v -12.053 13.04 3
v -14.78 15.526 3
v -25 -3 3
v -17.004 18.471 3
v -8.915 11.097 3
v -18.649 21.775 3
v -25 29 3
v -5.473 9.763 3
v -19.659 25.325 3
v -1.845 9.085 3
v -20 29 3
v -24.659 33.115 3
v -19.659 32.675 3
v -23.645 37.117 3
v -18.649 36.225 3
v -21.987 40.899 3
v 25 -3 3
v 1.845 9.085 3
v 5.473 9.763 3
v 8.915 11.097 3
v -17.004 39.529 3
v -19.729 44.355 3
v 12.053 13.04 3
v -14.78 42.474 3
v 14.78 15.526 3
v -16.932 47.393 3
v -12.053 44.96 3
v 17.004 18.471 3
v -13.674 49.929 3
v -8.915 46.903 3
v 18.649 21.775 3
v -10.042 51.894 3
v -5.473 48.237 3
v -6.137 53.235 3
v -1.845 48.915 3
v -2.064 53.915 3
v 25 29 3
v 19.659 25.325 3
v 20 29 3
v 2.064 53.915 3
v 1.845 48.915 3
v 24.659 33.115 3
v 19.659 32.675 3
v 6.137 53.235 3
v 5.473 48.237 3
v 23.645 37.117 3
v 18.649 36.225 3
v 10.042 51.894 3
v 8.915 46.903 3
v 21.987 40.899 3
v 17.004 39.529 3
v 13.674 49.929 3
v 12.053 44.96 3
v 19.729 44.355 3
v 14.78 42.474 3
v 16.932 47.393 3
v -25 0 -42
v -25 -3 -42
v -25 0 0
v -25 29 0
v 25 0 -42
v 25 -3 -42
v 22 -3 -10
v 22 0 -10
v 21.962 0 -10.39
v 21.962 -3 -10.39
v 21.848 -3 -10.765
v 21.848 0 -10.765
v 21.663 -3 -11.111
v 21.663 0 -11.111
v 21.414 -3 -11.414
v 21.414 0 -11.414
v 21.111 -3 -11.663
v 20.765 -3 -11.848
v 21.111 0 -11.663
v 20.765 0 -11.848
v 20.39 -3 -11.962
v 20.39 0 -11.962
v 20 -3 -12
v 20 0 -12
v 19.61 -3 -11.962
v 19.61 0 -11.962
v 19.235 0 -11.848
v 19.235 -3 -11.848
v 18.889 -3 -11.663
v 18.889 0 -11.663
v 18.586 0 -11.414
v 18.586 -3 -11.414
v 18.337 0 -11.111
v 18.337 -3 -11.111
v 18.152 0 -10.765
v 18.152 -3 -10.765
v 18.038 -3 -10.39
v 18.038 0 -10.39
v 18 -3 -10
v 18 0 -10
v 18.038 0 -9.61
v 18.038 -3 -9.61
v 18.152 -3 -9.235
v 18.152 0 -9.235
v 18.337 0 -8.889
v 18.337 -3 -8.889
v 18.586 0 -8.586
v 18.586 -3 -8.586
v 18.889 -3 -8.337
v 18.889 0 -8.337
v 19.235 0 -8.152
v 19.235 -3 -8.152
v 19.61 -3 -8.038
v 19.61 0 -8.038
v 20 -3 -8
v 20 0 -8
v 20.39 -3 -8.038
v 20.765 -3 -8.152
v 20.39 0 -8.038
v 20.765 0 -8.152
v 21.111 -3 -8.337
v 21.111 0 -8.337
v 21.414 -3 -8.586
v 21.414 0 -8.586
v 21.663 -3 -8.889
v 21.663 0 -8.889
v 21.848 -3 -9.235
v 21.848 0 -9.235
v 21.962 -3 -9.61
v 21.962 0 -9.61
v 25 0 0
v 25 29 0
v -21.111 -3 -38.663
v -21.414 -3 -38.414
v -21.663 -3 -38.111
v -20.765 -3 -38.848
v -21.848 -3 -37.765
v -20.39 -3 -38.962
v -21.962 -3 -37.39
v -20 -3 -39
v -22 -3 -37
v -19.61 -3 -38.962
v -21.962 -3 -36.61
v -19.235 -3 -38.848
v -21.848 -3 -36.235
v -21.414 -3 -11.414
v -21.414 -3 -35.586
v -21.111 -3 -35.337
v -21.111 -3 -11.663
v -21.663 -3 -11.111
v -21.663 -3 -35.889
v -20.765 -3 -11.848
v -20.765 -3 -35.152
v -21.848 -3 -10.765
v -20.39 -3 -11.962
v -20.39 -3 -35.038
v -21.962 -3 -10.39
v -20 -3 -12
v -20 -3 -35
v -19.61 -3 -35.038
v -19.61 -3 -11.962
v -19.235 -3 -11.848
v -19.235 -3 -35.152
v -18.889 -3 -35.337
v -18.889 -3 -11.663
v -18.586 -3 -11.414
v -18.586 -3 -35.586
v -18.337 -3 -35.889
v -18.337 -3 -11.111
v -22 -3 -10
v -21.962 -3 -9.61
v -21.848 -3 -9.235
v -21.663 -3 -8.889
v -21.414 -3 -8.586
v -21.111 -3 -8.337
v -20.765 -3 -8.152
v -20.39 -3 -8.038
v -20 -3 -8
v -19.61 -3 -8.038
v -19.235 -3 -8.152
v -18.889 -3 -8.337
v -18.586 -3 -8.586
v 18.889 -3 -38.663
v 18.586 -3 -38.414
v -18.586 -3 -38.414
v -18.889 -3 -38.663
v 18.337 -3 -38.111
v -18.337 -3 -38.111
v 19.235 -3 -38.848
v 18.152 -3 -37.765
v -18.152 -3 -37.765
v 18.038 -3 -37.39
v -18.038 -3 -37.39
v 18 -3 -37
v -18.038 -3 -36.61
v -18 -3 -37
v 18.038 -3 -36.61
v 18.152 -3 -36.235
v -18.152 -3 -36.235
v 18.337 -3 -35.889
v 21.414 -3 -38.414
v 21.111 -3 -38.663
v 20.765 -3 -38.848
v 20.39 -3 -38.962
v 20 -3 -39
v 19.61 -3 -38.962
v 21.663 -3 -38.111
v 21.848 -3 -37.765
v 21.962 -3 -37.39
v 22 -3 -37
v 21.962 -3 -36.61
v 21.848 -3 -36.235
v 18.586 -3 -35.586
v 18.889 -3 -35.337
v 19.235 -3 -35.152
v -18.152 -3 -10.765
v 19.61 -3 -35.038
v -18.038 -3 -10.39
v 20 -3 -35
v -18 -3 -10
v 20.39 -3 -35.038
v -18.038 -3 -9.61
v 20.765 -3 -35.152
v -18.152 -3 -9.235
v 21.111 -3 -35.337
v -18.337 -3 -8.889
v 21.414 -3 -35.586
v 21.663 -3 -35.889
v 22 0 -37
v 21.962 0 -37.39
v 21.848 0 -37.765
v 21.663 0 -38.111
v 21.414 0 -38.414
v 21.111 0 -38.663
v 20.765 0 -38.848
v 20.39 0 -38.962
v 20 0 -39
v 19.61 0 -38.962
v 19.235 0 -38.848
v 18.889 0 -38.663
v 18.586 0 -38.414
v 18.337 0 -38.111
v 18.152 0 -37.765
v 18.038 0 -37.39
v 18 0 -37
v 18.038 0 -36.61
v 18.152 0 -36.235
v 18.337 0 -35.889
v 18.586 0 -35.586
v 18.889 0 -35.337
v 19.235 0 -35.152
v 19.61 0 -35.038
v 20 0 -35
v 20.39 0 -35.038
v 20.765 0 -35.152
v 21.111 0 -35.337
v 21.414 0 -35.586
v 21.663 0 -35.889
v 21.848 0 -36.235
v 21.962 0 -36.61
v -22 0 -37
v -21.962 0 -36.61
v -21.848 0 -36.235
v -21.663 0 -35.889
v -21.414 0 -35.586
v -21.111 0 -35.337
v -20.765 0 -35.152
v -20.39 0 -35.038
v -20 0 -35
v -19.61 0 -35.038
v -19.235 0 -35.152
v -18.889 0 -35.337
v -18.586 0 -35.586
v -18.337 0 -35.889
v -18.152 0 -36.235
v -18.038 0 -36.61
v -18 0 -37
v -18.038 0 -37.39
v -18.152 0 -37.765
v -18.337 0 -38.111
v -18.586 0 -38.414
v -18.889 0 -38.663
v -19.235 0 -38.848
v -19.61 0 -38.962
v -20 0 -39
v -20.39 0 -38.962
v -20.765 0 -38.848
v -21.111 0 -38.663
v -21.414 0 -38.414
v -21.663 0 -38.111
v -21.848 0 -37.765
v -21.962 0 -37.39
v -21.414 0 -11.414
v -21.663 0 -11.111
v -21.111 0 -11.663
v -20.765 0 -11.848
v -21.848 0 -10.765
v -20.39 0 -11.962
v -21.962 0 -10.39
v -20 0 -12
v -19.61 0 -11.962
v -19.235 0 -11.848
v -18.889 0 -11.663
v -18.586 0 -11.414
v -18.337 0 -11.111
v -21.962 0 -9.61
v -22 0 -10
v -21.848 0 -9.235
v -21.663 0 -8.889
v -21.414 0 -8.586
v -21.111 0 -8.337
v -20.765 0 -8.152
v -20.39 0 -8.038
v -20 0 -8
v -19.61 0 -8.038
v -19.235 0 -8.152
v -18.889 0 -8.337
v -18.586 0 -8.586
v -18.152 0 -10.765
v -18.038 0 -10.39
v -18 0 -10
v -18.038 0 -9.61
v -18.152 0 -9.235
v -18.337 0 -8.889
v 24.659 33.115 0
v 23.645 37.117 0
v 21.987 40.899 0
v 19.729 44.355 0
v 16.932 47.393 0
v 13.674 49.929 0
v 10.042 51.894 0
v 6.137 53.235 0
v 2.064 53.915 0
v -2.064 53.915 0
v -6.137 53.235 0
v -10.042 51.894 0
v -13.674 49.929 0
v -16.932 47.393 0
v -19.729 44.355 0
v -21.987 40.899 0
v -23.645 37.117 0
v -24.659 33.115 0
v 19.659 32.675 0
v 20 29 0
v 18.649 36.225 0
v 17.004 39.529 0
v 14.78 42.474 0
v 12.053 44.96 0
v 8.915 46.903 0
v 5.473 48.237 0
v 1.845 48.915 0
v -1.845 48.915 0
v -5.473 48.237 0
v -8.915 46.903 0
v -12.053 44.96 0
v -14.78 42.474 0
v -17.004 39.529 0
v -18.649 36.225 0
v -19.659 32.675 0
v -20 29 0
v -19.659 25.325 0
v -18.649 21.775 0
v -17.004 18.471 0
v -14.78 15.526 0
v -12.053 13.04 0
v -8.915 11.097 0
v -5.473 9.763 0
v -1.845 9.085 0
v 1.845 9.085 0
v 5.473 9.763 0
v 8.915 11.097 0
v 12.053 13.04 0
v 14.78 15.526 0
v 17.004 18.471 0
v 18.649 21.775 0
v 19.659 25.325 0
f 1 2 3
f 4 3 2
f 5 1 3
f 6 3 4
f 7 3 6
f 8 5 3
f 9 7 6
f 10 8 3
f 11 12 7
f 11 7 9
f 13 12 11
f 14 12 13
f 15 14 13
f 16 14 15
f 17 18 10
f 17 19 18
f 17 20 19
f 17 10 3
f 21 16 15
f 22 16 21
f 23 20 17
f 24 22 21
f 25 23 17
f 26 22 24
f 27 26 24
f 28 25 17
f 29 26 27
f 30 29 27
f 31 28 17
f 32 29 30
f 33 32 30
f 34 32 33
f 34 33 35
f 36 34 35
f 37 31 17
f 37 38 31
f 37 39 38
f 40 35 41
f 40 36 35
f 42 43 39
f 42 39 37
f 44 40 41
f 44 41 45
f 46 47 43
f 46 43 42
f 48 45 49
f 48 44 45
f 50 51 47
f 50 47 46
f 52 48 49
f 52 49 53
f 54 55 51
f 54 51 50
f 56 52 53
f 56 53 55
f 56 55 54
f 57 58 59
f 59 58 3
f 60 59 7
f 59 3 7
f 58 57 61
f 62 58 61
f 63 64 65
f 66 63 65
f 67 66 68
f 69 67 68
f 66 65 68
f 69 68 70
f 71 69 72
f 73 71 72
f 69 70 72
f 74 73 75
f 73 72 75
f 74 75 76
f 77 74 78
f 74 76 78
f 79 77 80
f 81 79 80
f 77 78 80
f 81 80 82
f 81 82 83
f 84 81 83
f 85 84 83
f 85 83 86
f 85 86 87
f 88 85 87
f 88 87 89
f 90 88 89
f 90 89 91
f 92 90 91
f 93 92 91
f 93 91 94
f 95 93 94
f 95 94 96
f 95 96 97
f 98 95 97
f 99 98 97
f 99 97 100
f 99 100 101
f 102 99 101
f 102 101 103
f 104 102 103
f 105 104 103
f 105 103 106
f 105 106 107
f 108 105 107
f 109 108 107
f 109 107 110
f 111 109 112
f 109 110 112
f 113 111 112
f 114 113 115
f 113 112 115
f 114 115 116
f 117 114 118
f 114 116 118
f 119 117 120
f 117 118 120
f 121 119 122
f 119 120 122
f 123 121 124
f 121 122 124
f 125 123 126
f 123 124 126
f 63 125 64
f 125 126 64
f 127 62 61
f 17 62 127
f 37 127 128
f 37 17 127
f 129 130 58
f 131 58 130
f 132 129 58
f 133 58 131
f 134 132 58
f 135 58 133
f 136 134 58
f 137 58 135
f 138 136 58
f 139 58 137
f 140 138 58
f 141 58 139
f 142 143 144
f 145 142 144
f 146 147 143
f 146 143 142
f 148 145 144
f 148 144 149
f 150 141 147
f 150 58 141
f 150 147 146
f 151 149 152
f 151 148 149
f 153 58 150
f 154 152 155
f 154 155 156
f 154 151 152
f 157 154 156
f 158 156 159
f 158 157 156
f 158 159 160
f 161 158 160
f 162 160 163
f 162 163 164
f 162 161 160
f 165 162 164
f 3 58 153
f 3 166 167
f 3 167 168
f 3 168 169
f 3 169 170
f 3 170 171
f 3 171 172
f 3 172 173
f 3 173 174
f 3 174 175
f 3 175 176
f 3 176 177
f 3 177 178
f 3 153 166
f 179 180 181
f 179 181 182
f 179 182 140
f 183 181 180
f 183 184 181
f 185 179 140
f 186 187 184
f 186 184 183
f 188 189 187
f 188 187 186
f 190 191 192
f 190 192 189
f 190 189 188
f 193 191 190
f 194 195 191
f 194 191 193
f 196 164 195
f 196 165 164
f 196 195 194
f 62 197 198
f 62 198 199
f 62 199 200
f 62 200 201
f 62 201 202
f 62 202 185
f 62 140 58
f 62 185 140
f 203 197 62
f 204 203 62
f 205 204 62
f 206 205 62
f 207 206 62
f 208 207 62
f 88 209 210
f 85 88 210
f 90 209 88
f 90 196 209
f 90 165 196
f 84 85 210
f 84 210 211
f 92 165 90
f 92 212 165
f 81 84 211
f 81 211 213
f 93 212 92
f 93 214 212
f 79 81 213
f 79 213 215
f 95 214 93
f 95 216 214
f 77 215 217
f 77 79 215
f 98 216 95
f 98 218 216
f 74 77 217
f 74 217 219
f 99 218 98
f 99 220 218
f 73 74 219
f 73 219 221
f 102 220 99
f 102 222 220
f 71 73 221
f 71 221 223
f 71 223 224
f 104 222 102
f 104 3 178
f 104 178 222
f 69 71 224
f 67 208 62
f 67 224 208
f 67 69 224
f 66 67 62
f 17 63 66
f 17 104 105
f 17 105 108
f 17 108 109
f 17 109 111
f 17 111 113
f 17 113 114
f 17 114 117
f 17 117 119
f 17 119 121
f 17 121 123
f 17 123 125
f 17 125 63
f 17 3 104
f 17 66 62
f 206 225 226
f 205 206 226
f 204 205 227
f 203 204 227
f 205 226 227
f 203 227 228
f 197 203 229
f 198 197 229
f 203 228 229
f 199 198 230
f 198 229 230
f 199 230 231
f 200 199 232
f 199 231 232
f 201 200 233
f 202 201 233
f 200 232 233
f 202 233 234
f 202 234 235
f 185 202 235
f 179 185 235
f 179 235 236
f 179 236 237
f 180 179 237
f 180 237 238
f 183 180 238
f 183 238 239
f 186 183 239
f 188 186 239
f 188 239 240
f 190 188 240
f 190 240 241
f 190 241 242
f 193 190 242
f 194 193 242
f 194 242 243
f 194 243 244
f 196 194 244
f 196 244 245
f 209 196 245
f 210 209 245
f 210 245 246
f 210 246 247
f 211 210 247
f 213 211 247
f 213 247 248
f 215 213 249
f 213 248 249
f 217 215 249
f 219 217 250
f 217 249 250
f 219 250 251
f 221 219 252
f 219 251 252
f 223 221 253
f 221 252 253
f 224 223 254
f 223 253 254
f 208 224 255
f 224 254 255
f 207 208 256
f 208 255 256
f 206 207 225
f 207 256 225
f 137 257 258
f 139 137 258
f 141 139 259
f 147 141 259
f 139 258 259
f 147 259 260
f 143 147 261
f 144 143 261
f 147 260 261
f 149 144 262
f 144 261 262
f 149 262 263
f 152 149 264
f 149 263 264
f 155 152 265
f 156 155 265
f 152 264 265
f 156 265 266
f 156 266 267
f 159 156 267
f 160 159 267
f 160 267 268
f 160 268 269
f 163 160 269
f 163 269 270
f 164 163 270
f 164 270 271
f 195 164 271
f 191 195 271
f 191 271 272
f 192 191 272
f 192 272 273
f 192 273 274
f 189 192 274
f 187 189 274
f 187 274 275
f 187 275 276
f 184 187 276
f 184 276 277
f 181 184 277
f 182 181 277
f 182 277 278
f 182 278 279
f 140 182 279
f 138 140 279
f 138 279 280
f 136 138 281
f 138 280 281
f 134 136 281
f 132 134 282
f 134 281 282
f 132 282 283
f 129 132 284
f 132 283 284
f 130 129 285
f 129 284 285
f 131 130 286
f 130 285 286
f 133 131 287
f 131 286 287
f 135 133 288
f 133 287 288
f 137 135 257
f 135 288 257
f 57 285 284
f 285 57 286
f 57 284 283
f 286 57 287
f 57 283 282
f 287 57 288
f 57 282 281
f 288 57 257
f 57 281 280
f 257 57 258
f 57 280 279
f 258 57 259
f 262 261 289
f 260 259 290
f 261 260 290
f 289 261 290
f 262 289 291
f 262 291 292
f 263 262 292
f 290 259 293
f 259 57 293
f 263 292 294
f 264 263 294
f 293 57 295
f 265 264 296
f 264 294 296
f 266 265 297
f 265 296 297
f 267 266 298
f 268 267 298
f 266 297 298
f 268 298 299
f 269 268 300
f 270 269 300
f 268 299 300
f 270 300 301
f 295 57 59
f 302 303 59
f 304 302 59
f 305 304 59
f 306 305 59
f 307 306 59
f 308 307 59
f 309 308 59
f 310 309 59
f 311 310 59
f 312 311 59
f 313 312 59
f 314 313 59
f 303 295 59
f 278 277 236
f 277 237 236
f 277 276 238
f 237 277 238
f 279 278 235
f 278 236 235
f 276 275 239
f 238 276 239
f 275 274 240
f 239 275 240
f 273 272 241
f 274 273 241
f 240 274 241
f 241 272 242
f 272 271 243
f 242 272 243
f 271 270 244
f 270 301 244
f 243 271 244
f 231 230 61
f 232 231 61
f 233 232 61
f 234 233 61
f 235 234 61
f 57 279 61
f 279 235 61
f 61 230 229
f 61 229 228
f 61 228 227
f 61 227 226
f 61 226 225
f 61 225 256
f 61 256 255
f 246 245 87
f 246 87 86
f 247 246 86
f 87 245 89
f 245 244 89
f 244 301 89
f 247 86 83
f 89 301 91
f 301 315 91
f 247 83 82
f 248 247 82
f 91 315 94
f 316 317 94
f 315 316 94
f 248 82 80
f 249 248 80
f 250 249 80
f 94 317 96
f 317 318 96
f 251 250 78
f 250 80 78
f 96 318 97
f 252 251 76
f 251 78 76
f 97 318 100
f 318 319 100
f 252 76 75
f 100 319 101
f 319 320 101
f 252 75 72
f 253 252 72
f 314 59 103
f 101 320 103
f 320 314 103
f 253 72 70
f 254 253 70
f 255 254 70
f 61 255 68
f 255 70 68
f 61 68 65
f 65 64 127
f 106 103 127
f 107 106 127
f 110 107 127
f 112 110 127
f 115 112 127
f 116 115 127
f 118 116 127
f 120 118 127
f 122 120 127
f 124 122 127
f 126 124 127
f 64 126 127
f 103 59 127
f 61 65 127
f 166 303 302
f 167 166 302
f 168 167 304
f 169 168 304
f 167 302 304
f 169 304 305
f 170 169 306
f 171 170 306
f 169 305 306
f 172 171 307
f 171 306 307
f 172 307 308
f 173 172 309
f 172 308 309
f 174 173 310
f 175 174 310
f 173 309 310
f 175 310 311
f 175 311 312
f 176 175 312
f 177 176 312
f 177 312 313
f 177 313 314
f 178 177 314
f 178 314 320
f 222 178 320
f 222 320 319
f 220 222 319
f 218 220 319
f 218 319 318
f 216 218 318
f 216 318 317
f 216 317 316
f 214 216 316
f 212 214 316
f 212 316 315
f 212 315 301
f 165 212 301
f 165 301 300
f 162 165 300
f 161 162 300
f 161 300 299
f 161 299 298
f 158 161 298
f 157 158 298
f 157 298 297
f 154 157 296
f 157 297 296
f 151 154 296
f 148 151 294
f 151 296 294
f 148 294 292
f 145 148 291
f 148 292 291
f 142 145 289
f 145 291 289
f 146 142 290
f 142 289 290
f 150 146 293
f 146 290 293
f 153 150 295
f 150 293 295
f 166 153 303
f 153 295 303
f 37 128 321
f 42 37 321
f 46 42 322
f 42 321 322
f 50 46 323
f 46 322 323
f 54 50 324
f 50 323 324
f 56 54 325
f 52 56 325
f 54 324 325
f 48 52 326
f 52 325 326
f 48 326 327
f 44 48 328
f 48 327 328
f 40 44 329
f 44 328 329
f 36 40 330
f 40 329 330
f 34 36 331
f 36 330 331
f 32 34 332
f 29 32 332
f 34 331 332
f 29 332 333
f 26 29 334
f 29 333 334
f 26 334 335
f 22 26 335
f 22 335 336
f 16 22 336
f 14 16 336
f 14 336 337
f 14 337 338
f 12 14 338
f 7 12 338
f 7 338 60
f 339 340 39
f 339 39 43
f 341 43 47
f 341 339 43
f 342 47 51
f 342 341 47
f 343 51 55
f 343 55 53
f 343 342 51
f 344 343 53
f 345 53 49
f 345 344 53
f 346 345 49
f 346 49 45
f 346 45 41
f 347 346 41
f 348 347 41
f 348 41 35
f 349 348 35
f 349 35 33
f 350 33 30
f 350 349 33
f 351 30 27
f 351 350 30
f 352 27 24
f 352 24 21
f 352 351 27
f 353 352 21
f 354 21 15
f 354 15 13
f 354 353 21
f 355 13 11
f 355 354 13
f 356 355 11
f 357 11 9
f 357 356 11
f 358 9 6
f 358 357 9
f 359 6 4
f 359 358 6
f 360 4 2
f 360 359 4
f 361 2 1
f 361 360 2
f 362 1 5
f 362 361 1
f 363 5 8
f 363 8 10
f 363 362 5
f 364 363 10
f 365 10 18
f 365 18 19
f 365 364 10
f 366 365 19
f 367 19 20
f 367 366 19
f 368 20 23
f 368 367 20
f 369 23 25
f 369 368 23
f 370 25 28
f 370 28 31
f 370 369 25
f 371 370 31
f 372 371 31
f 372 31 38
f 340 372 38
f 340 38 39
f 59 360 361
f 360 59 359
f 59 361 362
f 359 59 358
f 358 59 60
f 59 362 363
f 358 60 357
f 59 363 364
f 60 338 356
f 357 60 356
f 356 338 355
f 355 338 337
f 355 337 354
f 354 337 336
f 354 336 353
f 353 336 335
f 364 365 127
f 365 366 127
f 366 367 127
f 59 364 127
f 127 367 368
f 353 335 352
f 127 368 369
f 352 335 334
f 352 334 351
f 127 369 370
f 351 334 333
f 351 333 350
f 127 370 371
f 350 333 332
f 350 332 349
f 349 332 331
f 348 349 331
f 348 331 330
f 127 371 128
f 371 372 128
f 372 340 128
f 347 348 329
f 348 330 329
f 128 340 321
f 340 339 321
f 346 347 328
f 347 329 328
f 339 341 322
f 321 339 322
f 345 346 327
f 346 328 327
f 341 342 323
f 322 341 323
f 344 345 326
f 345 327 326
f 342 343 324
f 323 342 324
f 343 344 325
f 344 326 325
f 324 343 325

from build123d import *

# Parameters (mm, degrees)
SKETCH1_R           = 20
BOSS_EXTRUDE1_DEPTH = 3
SKETCH2_W           = 50
SKETCH2_H           = 3
BOSS_EXTRUDE2_DEPTH = 45
SKETCH3_R           = 2
CUT_EXTRUDE1_DEPTH  = 73.835430939


with BuildPart() as part:
    # Sketch1 → Boss-Extrude1 (new body)
    with BuildSketch(Plane.XY):
        with BuildLine():
            Line((-25, 0), (25, 0))
            Line((25, 0), (25, 29))
            ThreePointArc((25, 29), (0, 54), (-25, 29))
            Line((-25, 29), (-25, 0))
        make_face()
        with Locations((0, 29)):
            Circle(SKETCH1_R, mode=Mode.SUBTRACT)
    extrude(amount=BOSS_EXTRUDE1_DEPTH)

    # Sketch2 → Boss-Extrude2 (add)
    with BuildSketch(Plane.XY.offset(3)):
        with Locations((0, -1.5)):
            Rectangle(SKETCH2_W, SKETCH2_H)
    extrude(amount=-BOSS_EXTRUDE2_DEPTH)

    # Sketch3 → Cut-Extrude1 (cut, through all)
    with BuildSketch(Plane(origin=(0, 0, 0), x_dir=(1, 0, 0), z_dir=(0, 1, 0))):
        with Locations(Location((-20, 37, 0), (0, 0, 180))):
            Circle(SKETCH3_R)
        with Locations(Location((-20, 10, 0), (0, 0, 180))):
            Circle(SKETCH3_R)
        with Locations((20, 10)):
            Circle(SKETCH3_R)
        with Locations((20, 37)):
            Circle(SKETCH3_R)
    extrude(amount=-CUT_EXTRUDE1_DEPTH, mode=Mode.SUBTRACT)


solid = part.part
